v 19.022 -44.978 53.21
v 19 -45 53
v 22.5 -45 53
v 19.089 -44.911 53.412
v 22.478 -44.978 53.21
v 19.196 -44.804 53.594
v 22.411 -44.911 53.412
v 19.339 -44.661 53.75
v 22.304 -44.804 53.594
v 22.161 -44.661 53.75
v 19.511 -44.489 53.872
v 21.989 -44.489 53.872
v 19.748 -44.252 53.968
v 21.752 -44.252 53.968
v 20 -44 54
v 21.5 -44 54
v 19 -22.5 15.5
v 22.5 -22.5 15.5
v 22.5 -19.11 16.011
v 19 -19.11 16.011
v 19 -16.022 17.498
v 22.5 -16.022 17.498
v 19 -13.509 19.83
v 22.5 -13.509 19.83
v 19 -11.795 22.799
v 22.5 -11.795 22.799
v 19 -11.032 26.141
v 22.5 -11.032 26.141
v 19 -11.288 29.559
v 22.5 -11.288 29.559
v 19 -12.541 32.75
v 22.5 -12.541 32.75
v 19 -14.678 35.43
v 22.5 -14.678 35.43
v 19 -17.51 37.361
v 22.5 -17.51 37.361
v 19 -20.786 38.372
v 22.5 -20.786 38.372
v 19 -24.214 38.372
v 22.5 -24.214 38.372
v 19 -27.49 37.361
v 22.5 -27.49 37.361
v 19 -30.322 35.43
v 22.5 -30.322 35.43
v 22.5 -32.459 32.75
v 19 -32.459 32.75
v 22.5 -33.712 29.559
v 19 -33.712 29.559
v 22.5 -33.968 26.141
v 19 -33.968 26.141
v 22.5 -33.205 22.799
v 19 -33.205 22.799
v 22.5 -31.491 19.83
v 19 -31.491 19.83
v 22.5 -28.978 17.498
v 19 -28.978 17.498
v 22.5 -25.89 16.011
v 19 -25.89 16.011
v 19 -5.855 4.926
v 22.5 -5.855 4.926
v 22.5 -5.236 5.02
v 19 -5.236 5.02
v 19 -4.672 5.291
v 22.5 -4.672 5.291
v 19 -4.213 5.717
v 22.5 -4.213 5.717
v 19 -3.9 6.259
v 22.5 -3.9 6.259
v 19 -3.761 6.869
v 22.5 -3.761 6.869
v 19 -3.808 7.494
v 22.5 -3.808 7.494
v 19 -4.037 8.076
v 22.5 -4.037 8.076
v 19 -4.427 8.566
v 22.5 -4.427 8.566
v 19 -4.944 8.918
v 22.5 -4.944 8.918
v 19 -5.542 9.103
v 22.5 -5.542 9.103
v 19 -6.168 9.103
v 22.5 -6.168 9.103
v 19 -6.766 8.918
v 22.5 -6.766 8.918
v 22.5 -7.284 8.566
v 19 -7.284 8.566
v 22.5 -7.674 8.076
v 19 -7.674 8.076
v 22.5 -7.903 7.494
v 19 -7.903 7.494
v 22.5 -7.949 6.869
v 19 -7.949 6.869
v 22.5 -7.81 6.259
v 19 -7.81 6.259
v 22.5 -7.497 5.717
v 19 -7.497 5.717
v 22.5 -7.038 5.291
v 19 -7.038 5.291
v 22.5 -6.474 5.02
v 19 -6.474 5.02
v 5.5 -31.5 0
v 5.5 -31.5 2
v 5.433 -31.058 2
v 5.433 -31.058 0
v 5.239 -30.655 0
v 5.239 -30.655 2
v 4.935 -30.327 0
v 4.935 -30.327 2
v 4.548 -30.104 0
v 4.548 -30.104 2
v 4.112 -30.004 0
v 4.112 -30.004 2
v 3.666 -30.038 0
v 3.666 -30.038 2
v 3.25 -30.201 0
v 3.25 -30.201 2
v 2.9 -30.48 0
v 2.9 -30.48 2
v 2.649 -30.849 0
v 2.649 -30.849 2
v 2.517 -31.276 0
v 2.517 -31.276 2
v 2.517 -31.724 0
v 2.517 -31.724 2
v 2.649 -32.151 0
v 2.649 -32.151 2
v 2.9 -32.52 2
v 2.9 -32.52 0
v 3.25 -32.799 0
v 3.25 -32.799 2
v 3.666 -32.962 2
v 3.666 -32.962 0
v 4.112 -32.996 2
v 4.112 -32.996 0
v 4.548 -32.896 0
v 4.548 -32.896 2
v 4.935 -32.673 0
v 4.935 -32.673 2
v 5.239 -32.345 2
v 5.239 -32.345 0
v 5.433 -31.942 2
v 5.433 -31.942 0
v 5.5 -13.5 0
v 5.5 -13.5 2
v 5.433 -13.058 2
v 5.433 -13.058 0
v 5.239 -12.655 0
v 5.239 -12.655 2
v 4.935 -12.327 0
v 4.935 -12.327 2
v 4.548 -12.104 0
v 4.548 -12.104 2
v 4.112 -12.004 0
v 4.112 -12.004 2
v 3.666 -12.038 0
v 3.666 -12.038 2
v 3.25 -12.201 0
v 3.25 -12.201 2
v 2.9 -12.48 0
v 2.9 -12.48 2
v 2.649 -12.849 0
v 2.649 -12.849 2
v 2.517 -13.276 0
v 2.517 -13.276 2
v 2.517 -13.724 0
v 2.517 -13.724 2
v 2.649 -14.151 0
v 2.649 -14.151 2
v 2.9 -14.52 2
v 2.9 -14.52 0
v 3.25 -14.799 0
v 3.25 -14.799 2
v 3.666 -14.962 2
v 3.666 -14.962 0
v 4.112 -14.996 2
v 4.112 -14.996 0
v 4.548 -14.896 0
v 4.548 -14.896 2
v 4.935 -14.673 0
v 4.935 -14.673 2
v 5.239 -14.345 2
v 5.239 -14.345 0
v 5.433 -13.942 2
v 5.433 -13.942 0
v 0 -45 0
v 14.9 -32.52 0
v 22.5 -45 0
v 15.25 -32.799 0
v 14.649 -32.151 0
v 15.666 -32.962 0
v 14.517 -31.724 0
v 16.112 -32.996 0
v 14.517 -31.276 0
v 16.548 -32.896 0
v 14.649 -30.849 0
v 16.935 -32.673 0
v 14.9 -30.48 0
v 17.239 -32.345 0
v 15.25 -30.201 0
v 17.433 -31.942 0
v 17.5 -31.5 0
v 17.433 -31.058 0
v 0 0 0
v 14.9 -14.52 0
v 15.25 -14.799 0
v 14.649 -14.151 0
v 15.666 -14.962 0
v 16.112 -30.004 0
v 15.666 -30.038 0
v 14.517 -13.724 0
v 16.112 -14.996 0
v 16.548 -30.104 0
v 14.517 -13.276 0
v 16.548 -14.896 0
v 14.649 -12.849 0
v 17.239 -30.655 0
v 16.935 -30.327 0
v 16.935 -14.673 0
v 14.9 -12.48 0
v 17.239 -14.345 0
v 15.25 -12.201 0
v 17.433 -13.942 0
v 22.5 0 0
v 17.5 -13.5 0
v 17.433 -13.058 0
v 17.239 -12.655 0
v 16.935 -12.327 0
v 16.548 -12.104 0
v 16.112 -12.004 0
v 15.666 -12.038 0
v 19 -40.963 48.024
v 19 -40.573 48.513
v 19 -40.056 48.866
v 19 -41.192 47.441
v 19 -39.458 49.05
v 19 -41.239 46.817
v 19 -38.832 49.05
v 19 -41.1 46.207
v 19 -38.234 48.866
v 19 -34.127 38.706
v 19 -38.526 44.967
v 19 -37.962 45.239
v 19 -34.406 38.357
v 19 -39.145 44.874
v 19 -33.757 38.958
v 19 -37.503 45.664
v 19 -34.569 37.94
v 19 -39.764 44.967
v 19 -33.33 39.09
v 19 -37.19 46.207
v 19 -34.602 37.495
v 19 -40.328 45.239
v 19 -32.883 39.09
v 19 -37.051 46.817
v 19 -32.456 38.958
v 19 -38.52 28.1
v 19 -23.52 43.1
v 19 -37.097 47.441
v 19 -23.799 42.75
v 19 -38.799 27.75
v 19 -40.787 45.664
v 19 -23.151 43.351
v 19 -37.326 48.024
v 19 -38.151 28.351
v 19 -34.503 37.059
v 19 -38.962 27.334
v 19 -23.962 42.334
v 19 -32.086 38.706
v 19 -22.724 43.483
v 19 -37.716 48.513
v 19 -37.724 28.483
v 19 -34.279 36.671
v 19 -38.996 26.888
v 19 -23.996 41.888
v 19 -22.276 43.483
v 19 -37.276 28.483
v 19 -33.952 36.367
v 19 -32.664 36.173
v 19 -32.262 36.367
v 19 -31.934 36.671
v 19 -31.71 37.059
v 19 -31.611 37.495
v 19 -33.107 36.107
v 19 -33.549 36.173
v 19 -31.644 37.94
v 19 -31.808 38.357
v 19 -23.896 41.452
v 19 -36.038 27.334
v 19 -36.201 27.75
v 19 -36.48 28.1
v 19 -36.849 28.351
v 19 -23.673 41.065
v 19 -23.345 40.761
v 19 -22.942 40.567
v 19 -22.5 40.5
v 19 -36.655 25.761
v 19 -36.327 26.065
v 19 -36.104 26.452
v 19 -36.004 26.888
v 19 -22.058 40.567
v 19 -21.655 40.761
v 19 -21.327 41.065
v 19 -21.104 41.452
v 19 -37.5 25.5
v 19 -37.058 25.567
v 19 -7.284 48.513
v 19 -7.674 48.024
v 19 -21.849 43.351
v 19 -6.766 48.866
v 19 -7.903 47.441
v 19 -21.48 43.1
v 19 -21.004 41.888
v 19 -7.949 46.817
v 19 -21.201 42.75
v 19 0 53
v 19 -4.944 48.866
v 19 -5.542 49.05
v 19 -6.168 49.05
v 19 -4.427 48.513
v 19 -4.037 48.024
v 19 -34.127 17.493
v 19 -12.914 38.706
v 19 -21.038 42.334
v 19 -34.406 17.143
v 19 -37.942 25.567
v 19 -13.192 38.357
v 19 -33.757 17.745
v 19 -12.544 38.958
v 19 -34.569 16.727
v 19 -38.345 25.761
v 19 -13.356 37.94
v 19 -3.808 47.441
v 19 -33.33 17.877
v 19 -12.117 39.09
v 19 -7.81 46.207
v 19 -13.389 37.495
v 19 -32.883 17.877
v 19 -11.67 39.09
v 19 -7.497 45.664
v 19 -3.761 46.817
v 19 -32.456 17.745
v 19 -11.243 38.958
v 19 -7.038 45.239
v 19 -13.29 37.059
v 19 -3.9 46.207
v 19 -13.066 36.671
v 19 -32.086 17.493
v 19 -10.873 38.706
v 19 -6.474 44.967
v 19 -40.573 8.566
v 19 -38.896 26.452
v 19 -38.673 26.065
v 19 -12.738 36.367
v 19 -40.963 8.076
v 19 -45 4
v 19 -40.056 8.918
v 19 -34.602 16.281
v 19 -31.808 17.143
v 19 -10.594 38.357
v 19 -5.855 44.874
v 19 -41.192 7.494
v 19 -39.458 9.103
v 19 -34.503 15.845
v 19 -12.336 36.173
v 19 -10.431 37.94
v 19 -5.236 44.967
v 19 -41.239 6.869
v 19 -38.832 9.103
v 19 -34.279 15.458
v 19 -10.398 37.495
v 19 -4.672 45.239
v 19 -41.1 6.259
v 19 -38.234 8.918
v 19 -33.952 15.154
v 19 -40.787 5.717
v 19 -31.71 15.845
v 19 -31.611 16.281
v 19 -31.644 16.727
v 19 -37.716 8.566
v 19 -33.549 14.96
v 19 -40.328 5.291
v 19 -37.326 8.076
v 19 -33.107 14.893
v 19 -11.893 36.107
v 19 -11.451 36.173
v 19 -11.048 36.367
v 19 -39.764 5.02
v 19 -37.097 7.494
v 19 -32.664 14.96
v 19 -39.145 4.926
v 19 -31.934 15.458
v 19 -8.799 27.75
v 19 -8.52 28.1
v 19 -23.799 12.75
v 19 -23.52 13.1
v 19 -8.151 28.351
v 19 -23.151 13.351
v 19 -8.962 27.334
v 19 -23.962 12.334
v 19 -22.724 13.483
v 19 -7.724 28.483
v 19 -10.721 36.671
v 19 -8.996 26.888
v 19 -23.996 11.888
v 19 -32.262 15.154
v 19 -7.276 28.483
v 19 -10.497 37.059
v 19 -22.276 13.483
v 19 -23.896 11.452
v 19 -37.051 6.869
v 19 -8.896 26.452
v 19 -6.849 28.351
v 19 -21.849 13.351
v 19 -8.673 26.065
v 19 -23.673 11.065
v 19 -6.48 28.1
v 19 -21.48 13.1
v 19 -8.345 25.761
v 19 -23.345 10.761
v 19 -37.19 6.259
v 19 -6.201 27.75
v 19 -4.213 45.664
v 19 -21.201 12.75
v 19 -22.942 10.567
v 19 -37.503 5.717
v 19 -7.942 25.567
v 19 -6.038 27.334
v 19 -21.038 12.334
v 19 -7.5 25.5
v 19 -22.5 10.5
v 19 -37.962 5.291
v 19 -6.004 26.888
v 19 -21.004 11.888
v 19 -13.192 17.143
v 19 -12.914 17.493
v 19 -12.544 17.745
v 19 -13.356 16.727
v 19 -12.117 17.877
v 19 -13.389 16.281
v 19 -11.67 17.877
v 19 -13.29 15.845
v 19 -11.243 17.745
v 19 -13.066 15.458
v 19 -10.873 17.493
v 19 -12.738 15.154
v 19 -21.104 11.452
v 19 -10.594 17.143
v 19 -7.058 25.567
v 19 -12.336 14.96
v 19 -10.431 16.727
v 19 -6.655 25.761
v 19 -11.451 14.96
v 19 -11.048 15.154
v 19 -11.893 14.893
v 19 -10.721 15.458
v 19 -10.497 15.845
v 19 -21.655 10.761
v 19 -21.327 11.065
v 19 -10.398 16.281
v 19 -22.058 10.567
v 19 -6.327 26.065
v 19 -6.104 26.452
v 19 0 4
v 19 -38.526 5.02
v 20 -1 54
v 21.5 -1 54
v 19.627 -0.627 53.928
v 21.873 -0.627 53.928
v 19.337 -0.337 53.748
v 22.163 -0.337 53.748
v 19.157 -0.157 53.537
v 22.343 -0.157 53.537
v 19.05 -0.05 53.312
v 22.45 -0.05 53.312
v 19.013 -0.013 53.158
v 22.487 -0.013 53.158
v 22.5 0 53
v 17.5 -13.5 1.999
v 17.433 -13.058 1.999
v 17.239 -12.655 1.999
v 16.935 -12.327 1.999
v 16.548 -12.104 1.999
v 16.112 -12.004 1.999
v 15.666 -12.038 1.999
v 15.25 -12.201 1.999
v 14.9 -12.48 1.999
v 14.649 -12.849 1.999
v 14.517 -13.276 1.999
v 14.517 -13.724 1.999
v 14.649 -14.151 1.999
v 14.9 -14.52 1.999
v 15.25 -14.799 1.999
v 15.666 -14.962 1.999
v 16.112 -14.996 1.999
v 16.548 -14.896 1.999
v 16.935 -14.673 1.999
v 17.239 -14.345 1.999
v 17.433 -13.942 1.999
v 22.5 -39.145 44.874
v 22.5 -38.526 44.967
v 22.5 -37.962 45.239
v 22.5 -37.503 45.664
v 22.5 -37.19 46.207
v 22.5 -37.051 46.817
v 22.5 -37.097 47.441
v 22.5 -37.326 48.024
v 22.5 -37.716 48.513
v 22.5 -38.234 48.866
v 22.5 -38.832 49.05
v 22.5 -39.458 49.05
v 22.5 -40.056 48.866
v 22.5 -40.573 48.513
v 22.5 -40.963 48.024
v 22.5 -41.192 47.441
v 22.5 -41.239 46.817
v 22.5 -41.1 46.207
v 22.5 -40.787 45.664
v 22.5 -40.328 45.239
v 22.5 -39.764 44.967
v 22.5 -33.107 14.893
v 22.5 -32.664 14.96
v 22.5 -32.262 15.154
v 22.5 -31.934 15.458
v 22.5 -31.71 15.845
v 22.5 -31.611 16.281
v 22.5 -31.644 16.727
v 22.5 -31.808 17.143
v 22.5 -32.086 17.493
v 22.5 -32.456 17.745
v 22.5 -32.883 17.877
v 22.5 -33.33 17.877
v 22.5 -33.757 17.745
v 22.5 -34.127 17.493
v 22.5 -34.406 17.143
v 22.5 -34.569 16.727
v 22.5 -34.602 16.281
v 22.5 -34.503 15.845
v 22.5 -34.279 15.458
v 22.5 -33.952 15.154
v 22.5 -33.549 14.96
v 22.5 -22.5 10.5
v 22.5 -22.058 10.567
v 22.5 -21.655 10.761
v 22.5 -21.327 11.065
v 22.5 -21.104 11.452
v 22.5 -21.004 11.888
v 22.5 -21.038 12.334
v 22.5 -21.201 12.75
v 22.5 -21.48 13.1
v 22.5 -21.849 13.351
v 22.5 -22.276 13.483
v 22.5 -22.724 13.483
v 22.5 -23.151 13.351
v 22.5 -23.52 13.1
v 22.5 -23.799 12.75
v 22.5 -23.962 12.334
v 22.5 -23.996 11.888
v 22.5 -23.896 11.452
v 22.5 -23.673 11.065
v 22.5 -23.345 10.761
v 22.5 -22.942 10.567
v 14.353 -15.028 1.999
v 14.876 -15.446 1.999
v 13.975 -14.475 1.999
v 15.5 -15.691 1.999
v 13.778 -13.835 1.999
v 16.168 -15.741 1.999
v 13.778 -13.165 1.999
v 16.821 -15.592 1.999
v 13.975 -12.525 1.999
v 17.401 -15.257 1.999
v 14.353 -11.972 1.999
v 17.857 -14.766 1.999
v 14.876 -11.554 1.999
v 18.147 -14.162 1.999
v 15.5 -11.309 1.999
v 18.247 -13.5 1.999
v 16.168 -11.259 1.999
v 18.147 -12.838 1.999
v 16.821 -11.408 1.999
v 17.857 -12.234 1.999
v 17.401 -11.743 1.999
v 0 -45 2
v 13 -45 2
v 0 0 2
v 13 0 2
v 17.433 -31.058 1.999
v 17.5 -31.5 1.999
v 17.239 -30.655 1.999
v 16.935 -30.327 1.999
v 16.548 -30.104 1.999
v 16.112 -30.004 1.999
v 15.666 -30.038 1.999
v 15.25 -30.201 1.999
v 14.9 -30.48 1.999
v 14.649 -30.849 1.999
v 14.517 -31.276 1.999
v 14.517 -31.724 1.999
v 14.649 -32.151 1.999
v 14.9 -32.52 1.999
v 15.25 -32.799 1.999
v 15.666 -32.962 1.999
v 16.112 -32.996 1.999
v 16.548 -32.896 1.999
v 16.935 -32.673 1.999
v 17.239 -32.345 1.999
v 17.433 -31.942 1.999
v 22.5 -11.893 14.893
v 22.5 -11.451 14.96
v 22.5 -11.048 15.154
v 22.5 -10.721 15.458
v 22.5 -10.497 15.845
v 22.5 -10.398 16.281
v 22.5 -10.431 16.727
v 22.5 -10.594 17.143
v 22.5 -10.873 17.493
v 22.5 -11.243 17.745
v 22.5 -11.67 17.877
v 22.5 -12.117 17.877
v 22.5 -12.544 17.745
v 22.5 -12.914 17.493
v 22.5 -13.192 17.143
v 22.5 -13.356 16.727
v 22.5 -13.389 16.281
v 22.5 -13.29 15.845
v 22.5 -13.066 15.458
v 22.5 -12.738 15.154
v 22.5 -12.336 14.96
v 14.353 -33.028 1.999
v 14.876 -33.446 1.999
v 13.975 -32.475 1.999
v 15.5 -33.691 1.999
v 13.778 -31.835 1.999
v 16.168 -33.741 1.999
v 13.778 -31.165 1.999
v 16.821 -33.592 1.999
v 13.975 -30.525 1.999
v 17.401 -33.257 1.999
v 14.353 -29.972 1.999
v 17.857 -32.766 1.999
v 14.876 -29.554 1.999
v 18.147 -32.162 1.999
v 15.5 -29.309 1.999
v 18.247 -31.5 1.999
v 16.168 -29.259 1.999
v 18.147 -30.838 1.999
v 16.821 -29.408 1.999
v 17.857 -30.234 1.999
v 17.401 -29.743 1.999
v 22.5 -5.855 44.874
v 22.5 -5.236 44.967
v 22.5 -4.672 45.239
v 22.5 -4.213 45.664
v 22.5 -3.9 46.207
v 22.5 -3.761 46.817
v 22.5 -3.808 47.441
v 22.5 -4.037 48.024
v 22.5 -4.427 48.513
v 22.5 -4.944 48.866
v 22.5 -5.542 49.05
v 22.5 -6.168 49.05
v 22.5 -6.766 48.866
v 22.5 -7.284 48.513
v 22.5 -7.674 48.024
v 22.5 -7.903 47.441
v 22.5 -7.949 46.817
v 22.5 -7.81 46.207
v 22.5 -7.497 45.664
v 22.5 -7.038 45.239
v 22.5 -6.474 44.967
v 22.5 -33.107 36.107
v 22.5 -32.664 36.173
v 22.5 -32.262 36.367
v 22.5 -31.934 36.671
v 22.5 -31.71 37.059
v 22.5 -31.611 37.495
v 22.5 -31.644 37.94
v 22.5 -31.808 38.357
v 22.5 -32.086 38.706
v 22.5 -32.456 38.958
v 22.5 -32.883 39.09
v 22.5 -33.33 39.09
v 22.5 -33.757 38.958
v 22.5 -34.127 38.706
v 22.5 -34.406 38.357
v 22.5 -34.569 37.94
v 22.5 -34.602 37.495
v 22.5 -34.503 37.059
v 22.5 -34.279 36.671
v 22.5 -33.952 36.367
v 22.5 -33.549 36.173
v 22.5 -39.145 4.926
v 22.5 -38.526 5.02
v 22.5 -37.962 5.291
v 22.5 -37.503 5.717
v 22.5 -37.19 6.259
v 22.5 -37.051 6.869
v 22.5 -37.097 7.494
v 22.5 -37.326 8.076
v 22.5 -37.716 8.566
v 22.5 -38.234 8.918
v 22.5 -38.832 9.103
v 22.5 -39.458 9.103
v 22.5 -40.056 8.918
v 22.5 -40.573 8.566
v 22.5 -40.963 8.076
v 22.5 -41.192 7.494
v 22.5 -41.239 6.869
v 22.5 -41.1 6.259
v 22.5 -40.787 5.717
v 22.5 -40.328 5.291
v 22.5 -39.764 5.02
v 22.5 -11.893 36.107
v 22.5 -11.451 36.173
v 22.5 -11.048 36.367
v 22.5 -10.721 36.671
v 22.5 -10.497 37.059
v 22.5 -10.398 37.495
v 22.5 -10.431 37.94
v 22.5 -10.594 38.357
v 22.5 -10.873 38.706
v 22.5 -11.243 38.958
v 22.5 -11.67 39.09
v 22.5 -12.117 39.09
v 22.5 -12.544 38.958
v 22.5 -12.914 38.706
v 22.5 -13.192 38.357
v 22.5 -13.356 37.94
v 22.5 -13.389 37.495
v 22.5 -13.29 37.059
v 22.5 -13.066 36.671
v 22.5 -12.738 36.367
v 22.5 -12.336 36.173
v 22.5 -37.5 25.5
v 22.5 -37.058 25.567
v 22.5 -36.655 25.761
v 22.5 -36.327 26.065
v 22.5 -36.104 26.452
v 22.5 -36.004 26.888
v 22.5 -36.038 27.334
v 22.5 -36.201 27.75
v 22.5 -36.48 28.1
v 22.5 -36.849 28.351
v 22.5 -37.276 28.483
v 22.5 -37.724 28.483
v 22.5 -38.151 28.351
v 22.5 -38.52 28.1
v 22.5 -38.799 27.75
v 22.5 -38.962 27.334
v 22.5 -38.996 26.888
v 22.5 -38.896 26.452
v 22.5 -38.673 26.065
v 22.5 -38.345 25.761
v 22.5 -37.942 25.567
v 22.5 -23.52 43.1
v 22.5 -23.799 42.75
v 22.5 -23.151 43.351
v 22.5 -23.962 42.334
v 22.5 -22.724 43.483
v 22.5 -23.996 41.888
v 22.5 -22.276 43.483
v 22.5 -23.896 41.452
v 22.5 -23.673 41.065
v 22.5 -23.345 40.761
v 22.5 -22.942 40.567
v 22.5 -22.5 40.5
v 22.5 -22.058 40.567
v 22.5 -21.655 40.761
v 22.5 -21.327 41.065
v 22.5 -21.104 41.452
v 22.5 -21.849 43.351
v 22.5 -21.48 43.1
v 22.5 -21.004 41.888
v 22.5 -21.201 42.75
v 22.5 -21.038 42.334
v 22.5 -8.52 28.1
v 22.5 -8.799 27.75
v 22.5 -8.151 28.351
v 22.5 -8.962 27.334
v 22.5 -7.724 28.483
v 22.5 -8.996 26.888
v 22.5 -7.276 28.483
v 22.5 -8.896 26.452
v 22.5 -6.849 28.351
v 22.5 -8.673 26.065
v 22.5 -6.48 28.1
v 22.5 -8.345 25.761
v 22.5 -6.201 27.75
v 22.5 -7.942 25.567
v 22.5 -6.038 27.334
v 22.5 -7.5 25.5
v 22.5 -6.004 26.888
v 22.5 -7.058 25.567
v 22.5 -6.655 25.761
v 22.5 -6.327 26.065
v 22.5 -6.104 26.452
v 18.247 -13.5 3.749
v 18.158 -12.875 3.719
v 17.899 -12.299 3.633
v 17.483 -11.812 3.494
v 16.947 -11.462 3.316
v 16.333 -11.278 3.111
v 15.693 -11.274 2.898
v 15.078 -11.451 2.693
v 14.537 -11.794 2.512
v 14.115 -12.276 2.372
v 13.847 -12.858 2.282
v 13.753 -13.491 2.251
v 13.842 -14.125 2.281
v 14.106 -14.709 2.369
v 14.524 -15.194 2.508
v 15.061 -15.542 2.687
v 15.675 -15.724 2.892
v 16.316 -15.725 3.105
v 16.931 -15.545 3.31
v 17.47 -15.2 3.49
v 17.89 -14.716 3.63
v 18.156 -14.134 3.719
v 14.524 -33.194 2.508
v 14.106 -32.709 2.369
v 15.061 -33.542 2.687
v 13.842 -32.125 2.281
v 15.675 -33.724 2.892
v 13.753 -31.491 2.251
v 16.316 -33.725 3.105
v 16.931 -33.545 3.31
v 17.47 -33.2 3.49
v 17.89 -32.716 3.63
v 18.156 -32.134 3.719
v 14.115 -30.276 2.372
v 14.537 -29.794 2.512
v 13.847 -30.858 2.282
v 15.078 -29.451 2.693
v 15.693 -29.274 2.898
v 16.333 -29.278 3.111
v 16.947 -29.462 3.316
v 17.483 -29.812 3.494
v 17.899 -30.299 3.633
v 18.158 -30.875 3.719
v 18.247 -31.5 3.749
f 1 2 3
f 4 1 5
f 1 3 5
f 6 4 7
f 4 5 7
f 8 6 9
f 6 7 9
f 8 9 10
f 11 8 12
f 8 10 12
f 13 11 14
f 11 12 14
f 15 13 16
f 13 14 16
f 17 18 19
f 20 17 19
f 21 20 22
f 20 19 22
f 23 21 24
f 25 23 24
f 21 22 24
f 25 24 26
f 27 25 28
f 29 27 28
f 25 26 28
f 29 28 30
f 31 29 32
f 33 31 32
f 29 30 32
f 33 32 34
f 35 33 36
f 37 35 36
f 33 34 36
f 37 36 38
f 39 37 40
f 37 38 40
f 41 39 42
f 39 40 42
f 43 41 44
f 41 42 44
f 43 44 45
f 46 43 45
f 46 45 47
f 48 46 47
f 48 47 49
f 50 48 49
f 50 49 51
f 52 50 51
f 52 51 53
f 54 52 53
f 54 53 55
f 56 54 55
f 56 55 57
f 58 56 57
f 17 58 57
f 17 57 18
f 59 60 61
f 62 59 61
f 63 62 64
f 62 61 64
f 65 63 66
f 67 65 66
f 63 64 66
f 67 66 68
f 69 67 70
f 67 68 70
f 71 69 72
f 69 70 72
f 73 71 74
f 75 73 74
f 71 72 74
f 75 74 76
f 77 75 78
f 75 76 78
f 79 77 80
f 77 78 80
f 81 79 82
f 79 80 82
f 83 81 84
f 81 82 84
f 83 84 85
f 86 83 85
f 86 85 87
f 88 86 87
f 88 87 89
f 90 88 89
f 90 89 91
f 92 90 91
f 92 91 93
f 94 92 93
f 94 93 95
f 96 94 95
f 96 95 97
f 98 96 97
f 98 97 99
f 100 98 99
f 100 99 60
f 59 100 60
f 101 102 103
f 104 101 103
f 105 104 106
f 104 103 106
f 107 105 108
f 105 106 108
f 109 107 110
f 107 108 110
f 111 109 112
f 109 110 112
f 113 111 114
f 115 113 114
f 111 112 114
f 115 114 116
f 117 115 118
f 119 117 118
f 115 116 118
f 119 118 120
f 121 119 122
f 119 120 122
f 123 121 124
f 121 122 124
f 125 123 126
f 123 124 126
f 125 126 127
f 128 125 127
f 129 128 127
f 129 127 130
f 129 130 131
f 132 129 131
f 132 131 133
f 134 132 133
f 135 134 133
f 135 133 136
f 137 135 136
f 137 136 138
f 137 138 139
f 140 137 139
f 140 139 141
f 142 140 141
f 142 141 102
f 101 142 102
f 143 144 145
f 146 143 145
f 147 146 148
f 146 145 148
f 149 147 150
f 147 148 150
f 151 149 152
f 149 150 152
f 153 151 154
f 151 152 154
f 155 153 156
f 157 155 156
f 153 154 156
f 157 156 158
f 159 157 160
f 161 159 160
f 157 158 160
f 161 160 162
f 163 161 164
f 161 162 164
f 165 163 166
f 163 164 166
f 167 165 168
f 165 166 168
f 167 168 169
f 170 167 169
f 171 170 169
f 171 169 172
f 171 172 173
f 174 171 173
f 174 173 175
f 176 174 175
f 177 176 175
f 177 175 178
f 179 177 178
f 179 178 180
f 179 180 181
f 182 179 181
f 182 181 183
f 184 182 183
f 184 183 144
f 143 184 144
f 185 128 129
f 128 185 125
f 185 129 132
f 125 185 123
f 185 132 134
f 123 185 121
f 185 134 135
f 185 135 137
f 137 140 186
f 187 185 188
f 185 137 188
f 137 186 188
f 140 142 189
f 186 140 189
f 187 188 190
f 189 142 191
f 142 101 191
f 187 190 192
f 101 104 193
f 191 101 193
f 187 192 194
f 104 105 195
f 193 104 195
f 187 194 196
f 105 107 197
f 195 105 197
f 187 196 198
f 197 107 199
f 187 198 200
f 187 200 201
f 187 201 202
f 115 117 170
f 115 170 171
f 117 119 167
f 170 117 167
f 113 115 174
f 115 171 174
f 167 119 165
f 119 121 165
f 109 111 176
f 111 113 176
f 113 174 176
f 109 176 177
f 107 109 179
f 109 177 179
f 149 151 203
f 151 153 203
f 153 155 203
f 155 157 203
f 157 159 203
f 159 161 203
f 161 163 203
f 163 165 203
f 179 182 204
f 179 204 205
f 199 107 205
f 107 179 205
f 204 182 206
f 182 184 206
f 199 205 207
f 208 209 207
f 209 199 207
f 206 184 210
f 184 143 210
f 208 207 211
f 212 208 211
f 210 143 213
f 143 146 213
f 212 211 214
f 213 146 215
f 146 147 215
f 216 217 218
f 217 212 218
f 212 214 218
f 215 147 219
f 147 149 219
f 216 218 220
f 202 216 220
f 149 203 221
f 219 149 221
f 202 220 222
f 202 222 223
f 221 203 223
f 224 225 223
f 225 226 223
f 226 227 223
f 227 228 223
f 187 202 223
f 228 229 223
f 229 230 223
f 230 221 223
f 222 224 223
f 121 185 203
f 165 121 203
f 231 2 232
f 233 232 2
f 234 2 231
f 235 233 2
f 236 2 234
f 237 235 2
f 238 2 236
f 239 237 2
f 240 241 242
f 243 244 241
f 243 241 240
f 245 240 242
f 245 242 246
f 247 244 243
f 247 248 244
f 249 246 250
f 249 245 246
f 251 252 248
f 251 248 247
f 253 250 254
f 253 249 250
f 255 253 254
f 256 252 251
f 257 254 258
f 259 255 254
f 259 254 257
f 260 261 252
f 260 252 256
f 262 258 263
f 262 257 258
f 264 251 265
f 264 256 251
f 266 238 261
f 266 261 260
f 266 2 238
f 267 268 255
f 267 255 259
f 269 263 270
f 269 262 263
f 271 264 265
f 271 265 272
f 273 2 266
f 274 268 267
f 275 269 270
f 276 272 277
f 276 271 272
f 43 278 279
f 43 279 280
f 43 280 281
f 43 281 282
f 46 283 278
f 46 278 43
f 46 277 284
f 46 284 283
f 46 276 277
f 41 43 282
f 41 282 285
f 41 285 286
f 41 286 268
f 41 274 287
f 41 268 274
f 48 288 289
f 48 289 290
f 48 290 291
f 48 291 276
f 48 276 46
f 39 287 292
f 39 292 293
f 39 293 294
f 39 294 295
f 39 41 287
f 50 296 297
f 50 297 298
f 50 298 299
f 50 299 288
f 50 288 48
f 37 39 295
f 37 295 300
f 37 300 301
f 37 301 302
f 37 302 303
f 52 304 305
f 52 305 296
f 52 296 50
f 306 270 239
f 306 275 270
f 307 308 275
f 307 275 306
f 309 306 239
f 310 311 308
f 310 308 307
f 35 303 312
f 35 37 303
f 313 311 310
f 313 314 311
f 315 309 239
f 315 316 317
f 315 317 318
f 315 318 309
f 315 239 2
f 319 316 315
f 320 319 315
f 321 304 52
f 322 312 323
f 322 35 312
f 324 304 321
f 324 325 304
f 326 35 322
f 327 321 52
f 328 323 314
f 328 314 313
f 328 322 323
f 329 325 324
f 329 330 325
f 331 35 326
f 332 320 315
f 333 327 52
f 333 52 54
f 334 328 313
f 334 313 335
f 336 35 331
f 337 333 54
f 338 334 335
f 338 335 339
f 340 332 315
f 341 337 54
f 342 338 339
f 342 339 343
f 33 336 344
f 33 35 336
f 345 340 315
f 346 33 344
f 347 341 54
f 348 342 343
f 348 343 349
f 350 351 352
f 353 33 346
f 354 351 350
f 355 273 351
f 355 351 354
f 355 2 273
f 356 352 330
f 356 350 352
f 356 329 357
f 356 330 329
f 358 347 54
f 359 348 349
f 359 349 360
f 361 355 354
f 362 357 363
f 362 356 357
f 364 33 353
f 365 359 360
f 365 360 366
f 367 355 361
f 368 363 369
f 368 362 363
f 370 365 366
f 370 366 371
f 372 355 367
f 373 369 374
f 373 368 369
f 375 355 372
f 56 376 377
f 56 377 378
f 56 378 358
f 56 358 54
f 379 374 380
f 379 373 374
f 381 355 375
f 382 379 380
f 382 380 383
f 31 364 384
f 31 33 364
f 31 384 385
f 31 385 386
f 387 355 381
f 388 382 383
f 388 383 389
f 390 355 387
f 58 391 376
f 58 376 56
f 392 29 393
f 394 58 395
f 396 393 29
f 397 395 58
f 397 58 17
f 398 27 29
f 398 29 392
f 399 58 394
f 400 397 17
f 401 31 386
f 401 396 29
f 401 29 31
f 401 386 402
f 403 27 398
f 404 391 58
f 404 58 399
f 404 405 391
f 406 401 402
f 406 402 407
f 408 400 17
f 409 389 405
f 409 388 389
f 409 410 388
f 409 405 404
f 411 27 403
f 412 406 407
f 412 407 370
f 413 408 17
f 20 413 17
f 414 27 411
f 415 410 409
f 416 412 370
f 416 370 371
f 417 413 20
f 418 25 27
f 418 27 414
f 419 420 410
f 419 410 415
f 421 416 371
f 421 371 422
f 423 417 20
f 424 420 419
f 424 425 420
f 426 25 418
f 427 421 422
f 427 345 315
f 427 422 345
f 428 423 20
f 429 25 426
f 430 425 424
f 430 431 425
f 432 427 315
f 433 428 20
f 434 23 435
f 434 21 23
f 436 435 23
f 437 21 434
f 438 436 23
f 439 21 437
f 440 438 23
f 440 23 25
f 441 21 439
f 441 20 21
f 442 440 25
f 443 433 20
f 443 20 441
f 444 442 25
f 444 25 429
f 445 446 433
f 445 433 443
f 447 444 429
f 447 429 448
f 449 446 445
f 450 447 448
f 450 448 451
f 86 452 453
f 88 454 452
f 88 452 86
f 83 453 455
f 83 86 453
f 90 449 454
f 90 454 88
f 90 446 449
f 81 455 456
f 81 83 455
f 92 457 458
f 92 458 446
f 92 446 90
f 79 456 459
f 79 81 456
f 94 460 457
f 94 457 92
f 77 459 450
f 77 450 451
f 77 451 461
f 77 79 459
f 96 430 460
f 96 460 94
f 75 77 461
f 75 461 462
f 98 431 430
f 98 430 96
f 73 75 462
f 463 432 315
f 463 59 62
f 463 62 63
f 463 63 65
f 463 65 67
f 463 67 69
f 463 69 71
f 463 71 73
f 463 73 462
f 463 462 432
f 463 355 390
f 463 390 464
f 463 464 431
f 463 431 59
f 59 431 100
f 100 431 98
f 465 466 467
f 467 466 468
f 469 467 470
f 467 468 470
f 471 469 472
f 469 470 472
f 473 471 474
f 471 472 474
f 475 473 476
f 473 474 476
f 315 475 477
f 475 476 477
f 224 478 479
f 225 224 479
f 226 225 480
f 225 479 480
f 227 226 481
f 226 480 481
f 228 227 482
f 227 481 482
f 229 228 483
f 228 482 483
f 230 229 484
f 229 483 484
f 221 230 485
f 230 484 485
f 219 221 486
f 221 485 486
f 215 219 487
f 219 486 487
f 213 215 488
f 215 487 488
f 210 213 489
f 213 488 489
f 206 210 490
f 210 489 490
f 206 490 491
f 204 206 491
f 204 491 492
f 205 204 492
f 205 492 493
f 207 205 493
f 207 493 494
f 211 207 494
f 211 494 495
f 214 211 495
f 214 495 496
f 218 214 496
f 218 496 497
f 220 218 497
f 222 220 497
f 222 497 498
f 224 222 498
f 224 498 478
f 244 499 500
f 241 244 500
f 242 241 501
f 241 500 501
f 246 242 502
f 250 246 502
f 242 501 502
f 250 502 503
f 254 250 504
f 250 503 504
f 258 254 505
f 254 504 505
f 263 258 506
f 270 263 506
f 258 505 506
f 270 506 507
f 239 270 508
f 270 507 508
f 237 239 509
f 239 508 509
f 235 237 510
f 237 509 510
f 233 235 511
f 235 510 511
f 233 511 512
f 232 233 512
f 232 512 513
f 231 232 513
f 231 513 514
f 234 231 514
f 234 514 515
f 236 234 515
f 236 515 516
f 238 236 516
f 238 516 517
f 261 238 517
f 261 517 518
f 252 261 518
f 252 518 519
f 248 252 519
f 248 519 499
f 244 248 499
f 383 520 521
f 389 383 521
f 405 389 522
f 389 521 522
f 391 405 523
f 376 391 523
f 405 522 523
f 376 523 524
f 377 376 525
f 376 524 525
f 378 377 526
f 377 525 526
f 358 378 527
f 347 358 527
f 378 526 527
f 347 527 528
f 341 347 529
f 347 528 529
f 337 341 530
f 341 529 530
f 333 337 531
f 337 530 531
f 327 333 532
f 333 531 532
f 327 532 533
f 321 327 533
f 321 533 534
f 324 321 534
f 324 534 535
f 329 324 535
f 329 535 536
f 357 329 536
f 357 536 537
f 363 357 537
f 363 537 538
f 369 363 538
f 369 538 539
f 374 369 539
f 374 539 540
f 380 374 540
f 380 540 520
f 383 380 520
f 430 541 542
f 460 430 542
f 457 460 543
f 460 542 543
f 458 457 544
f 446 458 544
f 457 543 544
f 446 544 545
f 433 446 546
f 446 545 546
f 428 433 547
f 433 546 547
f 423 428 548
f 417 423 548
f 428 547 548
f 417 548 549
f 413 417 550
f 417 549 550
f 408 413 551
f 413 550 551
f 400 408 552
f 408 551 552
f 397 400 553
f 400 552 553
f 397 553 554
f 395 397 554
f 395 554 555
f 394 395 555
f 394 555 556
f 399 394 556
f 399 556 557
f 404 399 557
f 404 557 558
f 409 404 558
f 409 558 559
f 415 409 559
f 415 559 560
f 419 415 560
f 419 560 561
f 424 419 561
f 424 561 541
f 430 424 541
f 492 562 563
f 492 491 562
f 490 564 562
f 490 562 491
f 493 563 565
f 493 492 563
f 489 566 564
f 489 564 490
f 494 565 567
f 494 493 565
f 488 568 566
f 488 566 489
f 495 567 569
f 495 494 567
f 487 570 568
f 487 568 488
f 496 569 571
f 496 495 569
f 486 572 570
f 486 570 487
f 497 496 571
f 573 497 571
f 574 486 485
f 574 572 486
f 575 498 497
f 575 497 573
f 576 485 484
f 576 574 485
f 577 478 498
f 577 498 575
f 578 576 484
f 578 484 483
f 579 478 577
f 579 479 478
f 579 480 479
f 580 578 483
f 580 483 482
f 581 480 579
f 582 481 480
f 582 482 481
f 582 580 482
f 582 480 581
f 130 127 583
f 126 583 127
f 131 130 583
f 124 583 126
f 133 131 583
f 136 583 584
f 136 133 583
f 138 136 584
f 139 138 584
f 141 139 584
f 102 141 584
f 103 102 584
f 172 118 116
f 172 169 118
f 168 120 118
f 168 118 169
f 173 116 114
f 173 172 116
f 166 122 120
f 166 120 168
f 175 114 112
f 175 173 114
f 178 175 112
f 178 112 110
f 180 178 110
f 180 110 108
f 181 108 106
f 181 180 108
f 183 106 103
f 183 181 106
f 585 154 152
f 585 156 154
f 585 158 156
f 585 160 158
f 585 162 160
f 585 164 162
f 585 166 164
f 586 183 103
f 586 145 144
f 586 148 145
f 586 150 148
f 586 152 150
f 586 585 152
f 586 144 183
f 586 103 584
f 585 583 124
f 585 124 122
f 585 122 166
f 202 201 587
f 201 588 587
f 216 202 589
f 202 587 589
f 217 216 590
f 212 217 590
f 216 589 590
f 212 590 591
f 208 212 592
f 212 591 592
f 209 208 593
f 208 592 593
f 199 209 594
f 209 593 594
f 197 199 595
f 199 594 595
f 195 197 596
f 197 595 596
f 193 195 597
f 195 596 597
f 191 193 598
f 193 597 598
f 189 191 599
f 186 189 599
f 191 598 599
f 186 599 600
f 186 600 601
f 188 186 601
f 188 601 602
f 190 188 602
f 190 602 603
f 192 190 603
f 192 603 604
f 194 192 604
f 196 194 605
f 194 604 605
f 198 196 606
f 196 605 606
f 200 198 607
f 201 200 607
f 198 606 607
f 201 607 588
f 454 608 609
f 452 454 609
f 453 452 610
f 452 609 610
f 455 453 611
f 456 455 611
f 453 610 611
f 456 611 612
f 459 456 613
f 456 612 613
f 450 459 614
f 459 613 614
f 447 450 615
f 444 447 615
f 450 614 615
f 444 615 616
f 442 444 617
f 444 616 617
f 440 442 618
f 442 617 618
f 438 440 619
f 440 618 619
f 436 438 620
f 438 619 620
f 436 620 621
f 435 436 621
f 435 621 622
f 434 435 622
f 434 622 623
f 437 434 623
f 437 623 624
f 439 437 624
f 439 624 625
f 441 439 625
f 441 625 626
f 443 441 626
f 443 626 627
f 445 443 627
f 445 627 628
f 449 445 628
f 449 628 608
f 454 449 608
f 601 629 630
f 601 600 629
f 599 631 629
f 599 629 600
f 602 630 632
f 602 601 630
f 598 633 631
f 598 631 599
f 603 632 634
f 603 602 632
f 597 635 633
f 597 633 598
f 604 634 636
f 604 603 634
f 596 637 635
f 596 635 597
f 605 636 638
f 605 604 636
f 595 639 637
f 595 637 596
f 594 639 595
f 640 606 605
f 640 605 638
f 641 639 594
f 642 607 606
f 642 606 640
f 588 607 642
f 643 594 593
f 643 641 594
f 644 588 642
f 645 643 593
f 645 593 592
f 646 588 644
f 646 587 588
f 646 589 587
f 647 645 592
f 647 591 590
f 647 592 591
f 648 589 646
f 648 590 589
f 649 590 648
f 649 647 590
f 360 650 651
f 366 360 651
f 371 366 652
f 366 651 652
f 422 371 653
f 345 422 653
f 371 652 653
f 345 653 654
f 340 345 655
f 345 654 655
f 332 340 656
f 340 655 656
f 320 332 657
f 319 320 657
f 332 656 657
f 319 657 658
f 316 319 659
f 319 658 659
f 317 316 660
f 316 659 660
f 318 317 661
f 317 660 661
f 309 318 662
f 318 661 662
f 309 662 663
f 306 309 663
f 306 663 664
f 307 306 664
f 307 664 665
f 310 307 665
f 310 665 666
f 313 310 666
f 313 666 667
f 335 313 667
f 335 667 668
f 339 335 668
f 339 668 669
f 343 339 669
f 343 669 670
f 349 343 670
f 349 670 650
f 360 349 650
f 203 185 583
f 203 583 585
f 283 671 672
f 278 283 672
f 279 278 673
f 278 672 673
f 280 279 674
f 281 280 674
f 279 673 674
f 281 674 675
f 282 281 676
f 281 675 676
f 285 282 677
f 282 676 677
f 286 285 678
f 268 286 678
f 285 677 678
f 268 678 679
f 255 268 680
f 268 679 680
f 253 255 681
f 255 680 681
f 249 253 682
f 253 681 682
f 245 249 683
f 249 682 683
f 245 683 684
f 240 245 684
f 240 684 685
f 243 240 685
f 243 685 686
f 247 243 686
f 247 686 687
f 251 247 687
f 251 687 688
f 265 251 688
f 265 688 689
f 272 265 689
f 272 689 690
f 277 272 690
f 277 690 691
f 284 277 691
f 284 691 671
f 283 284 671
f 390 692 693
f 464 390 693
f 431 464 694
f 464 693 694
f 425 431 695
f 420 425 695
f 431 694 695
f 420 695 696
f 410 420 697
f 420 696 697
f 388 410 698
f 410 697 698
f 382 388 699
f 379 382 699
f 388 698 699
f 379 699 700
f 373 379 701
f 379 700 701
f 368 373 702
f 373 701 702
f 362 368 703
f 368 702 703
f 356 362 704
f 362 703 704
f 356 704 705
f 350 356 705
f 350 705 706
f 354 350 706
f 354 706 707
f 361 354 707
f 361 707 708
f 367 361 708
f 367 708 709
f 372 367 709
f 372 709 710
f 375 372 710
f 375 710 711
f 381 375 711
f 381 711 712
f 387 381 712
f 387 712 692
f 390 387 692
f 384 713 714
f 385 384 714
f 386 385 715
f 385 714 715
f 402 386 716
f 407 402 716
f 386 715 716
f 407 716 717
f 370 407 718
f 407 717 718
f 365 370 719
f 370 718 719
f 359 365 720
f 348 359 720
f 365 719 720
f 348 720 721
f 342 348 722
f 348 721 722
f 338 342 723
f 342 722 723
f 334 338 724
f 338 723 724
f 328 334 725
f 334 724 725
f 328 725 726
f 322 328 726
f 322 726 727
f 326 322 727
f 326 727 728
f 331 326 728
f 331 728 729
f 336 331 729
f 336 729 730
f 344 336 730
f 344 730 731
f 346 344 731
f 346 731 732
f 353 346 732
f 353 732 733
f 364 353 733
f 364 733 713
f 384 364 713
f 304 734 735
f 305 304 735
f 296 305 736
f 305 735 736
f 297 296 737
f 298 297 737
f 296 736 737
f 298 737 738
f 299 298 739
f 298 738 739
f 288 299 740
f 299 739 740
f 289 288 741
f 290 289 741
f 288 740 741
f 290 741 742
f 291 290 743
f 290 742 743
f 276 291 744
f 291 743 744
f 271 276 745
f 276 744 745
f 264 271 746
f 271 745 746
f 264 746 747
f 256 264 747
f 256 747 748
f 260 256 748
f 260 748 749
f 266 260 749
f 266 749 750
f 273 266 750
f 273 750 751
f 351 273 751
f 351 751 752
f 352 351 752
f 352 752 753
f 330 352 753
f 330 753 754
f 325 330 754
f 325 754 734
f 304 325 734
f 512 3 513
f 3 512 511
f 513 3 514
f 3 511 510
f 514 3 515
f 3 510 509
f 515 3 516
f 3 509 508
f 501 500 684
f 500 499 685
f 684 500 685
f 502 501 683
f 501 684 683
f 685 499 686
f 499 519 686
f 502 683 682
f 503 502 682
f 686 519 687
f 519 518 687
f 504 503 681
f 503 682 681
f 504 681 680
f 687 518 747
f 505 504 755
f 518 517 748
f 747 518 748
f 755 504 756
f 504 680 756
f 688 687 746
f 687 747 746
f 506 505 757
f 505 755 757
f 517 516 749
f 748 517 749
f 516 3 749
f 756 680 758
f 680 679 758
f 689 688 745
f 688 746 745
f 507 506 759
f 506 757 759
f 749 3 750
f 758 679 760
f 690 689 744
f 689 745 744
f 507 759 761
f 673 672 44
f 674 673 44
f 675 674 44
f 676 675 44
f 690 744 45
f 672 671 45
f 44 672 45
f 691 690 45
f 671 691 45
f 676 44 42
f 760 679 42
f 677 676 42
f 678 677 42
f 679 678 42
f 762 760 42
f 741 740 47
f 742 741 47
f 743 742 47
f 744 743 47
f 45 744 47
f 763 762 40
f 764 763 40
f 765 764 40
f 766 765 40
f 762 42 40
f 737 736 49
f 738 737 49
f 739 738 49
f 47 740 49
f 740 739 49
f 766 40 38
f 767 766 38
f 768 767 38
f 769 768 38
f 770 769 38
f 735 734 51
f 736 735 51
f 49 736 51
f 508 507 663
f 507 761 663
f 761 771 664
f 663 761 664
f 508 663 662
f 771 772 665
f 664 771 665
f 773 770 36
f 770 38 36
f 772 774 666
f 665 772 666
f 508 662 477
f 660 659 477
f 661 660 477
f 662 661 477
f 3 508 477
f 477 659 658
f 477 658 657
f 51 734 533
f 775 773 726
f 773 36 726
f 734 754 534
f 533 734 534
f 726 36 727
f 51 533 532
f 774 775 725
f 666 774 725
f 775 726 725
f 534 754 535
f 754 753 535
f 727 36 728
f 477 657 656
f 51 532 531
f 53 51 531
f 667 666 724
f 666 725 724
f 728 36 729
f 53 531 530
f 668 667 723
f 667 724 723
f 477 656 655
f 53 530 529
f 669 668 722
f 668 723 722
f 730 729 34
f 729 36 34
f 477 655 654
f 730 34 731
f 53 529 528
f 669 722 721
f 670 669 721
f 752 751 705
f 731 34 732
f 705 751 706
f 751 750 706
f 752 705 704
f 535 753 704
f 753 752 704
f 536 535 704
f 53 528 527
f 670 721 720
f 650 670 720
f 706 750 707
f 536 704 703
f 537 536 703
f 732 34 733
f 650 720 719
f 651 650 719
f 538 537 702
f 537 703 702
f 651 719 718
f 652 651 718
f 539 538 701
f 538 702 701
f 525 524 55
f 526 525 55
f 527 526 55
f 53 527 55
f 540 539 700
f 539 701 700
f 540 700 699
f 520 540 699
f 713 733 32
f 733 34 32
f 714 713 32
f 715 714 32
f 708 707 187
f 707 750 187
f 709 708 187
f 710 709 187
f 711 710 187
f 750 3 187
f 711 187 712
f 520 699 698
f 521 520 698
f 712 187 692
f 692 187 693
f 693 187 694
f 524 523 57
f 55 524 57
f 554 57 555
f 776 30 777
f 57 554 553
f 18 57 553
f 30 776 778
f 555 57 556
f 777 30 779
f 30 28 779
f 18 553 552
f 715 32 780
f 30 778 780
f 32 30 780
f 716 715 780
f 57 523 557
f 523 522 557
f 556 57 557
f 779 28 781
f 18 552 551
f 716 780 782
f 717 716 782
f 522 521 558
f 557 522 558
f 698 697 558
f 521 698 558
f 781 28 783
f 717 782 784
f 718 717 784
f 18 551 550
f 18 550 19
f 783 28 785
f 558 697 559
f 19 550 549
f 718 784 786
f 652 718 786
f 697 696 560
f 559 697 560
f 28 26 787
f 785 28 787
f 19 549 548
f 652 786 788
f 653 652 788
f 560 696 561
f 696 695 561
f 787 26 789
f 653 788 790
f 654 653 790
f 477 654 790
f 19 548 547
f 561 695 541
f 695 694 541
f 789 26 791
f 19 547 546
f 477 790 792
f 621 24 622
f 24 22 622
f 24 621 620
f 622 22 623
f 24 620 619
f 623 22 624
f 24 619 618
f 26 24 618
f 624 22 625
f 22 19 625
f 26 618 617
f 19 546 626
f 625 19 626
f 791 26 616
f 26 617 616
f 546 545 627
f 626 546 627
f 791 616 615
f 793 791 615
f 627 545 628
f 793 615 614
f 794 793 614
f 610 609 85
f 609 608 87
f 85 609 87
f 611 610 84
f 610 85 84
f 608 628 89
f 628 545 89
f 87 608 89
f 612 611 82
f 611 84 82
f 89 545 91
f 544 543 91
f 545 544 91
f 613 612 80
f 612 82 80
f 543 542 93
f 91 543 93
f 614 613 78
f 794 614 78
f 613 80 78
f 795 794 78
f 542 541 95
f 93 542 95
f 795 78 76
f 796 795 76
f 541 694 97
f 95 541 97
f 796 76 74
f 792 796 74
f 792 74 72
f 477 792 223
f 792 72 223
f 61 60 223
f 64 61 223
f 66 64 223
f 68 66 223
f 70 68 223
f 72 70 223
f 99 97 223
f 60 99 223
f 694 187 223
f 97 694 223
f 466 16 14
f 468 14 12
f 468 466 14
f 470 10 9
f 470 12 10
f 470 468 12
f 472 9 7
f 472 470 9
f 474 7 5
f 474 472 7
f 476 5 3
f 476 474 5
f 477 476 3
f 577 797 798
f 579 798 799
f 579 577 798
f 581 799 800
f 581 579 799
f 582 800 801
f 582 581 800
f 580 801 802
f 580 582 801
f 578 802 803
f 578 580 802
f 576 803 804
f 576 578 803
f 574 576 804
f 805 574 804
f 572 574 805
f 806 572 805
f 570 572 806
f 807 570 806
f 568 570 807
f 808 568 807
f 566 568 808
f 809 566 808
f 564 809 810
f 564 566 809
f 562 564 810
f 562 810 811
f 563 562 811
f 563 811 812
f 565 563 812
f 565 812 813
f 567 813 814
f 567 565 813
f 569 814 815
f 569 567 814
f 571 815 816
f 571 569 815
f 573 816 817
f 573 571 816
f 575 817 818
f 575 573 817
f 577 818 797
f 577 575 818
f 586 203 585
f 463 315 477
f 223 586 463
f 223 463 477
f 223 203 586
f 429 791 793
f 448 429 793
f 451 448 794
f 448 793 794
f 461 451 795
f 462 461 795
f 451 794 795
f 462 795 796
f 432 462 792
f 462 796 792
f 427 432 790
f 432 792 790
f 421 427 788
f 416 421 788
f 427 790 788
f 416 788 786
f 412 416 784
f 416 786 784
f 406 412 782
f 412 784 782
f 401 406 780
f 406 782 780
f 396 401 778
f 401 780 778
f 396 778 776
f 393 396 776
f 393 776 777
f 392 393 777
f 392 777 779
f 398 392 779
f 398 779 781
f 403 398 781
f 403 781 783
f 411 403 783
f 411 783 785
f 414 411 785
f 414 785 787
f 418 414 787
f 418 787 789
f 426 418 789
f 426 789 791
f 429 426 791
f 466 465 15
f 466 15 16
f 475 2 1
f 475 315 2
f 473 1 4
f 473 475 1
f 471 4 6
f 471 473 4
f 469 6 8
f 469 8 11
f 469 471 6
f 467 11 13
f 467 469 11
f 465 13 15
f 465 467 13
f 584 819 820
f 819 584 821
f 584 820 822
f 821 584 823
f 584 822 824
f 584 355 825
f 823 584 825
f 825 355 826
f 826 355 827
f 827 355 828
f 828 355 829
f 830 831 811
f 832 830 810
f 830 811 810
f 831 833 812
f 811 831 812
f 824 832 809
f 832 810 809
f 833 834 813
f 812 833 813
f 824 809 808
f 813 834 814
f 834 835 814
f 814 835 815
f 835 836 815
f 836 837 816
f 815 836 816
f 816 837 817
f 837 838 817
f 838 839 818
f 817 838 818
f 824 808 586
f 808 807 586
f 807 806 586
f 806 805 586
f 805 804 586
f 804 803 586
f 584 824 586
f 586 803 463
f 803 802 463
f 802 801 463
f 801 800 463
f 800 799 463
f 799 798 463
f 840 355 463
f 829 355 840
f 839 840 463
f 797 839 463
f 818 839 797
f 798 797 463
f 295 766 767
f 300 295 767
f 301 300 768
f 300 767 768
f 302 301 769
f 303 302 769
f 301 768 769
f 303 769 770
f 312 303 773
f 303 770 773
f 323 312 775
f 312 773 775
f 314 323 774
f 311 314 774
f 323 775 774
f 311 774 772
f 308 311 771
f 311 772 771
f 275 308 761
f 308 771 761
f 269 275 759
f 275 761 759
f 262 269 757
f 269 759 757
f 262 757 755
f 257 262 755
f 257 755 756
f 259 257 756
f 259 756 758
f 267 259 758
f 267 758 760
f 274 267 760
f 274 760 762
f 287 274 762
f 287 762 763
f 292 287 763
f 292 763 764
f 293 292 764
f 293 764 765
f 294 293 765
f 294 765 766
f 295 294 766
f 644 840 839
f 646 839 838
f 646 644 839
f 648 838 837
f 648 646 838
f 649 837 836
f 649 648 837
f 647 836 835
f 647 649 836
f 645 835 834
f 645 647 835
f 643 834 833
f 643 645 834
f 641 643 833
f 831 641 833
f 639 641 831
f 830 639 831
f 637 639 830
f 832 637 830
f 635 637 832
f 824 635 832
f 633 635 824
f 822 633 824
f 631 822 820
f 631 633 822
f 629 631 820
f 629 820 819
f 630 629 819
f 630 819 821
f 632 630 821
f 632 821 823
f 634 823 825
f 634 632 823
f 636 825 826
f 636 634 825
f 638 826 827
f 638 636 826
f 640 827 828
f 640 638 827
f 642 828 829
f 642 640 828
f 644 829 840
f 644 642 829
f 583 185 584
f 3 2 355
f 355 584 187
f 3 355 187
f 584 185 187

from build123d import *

# Parameters (mm, degrees)
SKETCH_1_W               = 22.5
SKETCH_1_H               = 45
EXTRUDE_1_DEPTH          = 2
SKETCH_2_W               = 3.5
SKETCH_2_H               = 45
EXTRUDE_2_DEPTH          = 52
CUT_EXTRUDE_2_REACH      = 24.5
SKETCH_3_R               = 2.1
SKETCH_3_R_2             = 11.5
SKETCH_3_R_3             = 1.5
CHAMFER_1_SIZE           = 6
CHAMFER_1_SIZE2          = 2
FILLET_1_R               = 1
SKETCH_4_R               = 1.5
CUT_EXTRUDE_3_DEPTH      = 5
SKETCH_5_R               = 2.24713436
CUT_EXTRUDE_4_DEPTH      = 15
CUT_EXTRUDE_4_DEPTH_BACK = 0.001


with BuildPart() as part:
    # 草图1 → 凸台-拉伸1 (new body)
    with BuildSketch(Plane.XY):
        with Locations((11.25, -22.5)):
            Rectangle(SKETCH_1_W, SKETCH_1_H)
    extrude(amount=EXTRUDE_1_DEPTH)

    # 草图2 → 凸台-拉伸2 (add)
    with BuildSketch(Plane.XY.offset(2)):
        with Locations((20.75, -22.5)):
            Rectangle(SKETCH_2_W, SKETCH_2_H)
    extrude(amount=EXTRUDE_2_DEPTH)

    # 草图3 → 切除-拉伸2 (cut, up to next)
    with BuildSketch(Plane(origin=(22.5, 0, 0), x_dir=(0, 0, -1), z_dir=(1, 0, 0)), mode=Mode.PRIVATE) as cut_extrude_2_sk1:
        with Locations((-46.97375327, -5.855205609)):
            Circle(SKETCH_3_R)
    cut_extrude_2_tool1 = extrude(cut_extrude_2_sk1.sketch, amount=-CUT_EXTRUDE_2_REACH, mode=Mode.PRIVATE) & part.part
    add(cut_extrude_2_tool1.solids().sort_by_distance((22.5, -5.855206, 46.973753))[0], mode=Mode.SUBTRACT)
    # 草图3 → 切除-拉伸2 (cut, up to next)
    with BuildSketch(Plane(origin=(22.5, 0, 0), x_dir=(0, 0, -1), z_dir=(1, 0, 0)), mode=Mode.PRIVATE) as cut_extrude_2_sk2:
        with Locations((-7.02624673, -39.144794391)):
            Circle(SKETCH_3_R)
    cut_extrude_2_tool2 = extrude(cut_extrude_2_sk2.sketch, amount=-CUT_EXTRUDE_2_REACH, mode=Mode.PRIVATE) & part.part
    add(cut_extrude_2_tool2.solids().sort_by_distance((22.5, -39.144794, 7.026247))[0], mode=Mode.SUBTRACT)
    # 草图3 → 切除-拉伸2 (cut, up to next)
    with BuildSketch(Plane(origin=(22.5, 0, 0), x_dir=(0, 0, -1), z_dir=(1, 0, 0)), mode=Mode.PRIVATE) as cut_extrude_2_sk3:
        with Locations((-27, -22.5)):
            Circle(SKETCH_3_R_2)
    cut_extrude_2_tool3 = extrude(cut_extrude_2_sk3.sketch, amount=-CUT_EXTRUDE_2_REACH, mode=Mode.PRIVATE) & part.part
    add(cut_extrude_2_tool3.solids().sort_by_distance((22.5, -22.5, 27))[0], mode=Mode.SUBTRACT)
    # 草图3 → 切除-拉伸2 (cut, up to next)
    with BuildSketch(Plane(origin=(22.5, 0, 0), x_dir=(0, 0, -1), z_dir=(1, 0, 0)), mode=Mode.PRIVATE) as cut_extrude_2_sk4:
        with Locations((-46.97375327, -39.144794391)):
            Circle(SKETCH_3_R)
    cut_extrude_2_tool4 = extrude(cut_extrude_2_sk4.sketch, amount=-CUT_EXTRUDE_2_REACH, mode=Mode.PRIVATE) & part.part
    add(cut_extrude_2_tool4.solids().sort_by_distance((22.5, -39.144794, 46.973753))[0], mode=Mode.SUBTRACT)
    # 草图3 → 切除-拉伸2 (cut, up to next)
    with BuildSketch(Plane(origin=(22.5, 0, 0), x_dir=(0, 0, -1), z_dir=(1, 0, 0)), mode=Mode.PRIVATE) as cut_extrude_2_sk5:
        with Locations((-7.02624673, -5.855205609)):
            Circle(SKETCH_3_R)
    cut_extrude_2_tool5 = extrude(cut_extrude_2_sk5.sketch, amount=-CUT_EXTRUDE_2_REACH, mode=Mode.PRIVATE) & part.part
    add(cut_extrude_2_tool5.solids().sort_by_distance((22.5, -5.855206, 7.026247))[0], mode=Mode.SUBTRACT)
    # 草图3 → 切除-拉伸2 (cut, up to next)
    with BuildSketch(Plane(origin=(22.5, 0, 0), x_dir=(0, 0, -1), z_dir=(1, 0, 0)), mode=Mode.PRIVATE) as cut_extrude_2_sk6:
        with Locations((-42, -22.5)):
            Circle(SKETCH_3_R_3)
    cut_extrude_2_tool6 = extrude(cut_extrude_2_sk6.sketch, amount=-CUT_EXTRUDE_2_REACH, mode=Mode.PRIVATE) & part.part
    add(cut_extrude_2_tool6.solids().sort_by_distance((22.5, -22.5, 42))[0], mode=Mode.SUBTRACT)
    # 草图3 → 切除-拉伸2 (cut, up to next)
    with BuildSketch(Plane(origin=(22.5, 0, 0), x_dir=(0, 0, -1), z_dir=(1, 0, 0)), mode=Mode.PRIVATE) as cut_extrude_2_sk7:
        with Locations((-37.606601718, -11.893398282)):
            Circle(SKETCH_3_R_3)
    cut_extrude_2_tool7 = extrude(cut_extrude_2_sk7.sketch, amount=-CUT_EXTRUDE_2_REACH, mode=Mode.PRIVATE) & part.part
    add(cut_extrude_2_tool7.solids().sort_by_distance((22.5, -11.893398, 37.606602))[0], mode=Mode.SUBTRACT)
    # 草图3 → 切除-拉伸2 (cut, up to next)
    with BuildSketch(Plane(origin=(22.5, 0, 0), x_dir=(0, 0, -1), z_dir=(1, 0, 0)), mode=Mode.PRIVATE) as cut_extrude_2_sk8:
        with Locations((-27, -7.5)):
            Circle(SKETCH_3_R_3)
    cut_extrude_2_tool8 = extrude(cut_extrude_2_sk8.sketch, amount=-CUT_EXTRUDE_2_REACH, mode=Mode.PRIVATE) & part.part
    add(cut_extrude_2_tool8.solids().sort_by_distance((22.5, -7.5, 27))[0], mode=Mode.SUBTRACT)
    # 草图3 → 切除-拉伸2 (cut, up to next)
    with BuildSketch(Plane(origin=(22.5, 0, 0), x_dir=(0, 0, -1), z_dir=(1, 0, 0)), mode=Mode.PRIVATE) as cut_extrude_2_sk9:
        with Locations((-16.393398282, -11.893398282)):
            Circle(SKETCH_3_R_3)
    cut_extrude_2_tool9 = extrude(cut_extrude_2_sk9.sketch, amount=-CUT_EXTRUDE_2_REACH, mode=Mode.PRIVATE) & part.part
    add(cut_extrude_2_tool9.solids().sort_by_distance((22.5, -11.893398, 16.393398))[0], mode=Mode.SUBTRACT)
    # 草图3 → 切除-拉伸2 (cut, up to next)
    with BuildSketch(Plane(origin=(22.5, 0, 0), x_dir=(0, 0, -1), z_dir=(1, 0, 0)), mode=Mode.PRIVATE) as cut_extrude_2_sk10:
        with Locations((-12, -22.5)):
            Circle(SKETCH_3_R_3)
    cut_extrude_2_tool10 = extrude(cut_extrude_2_sk10.sketch, amount=-CUT_EXTRUDE_2_REACH, mode=Mode.PRIVATE) & part.part
    add(cut_extrude_2_tool10.solids().sort_by_distance((22.5, -22.5, 12))[0], mode=Mode.SUBTRACT)
    # 草图3 → 切除-拉伸2 (cut, up to next)
    with BuildSketch(Plane(origin=(22.5, 0, 0), x_dir=(0, 0, -1), z_dir=(1, 0, 0)), mode=Mode.PRIVATE) as cut_extrude_2_sk11:
        with Locations((-16.393398282, -33.106601718)):
            Circle(SKETCH_3_R_3)
    cut_extrude_2_tool11 = extrude(cut_extrude_2_sk11.sketch, amount=-CUT_EXTRUDE_2_REACH, mode=Mode.PRIVATE) & part.part
    add(cut_extrude_2_tool11.solids().sort_by_distance((22.5, -33.106602, 16.393398))[0], mode=Mode.SUBTRACT)
    # 草图3 → 切除-拉伸2 (cut, up to next)
    with BuildSketch(Plane(origin=(22.5, 0, 0), x_dir=(0, 0, -1), z_dir=(1, 0, 0)), mode=Mode.PRIVATE) as cut_extrude_2_sk12:
        with Locations((-27, -37.5)):
            Circle(SKETCH_3_R_3)
    cut_extrude_2_tool12 = extrude(cut_extrude_2_sk12.sketch, amount=-CUT_EXTRUDE_2_REACH, mode=Mode.PRIVATE) & part.part
    add(cut_extrude_2_tool12.solids().sort_by_distance((22.5, -37.5, 27))[0], mode=Mode.SUBTRACT)
    # 草图3 → 切除-拉伸2 (cut, up to next)
    with BuildSketch(Plane(origin=(22.5, 0, 0), x_dir=(0, 0, -1), z_dir=(1, 0, 0)), mode=Mode.PRIVATE) as cut_extrude_2_sk13:
        with Locations((-37.606601718, -33.106601718)):
            Circle(SKETCH_3_R_3)
    cut_extrude_2_tool13 = extrude(cut_extrude_2_sk13.sketch, amount=-CUT_EXTRUDE_2_REACH, mode=Mode.PRIVATE) & part.part
    add(cut_extrude_2_tool13.solids().sort_by_distance((22.5, -33.106602, 37.606602))[0], mode=Mode.SUBTRACT)

    # 倒角1
    chamfer_1_edges = [part.edges().sort_by_distance(p)[0] for p in [
        (19, -22.5, 2),
    ]]
    chamfer_1_side = [part.faces().sort_by_distance(p)[0] for p in [
        (9.5, -22.5, 2),
    ]]
    chamfer(chamfer_1_edges, length=CHAMFER_1_SIZE, length2=CHAMFER_1_SIZE2, reference=chamfer_1_side[0])

    # 圆角1
    fillet_1_edges = [part.edges().sort_by_distance(p)[0] for p in [
        (20.75, 0, 54),
        (19, -22.5, 54),
        (20.75, -45, 54),
        (22.5, -22.5, 54),
    ]]
    fillet(fillet_1_edges, radius=FILLET_1_R)

    # 草图4 → 切除-拉伸3 (cut, symmetric)
    with BuildSketch(Plane.XY.offset(2)):
        with Locations((4, -31.5)):
            Circle(SKETCH_4_R)
        with Locations((4, -13.5)):
            Circle(SKETCH_4_R)
        with Locations((16, -13.5)):
            Circle(SKETCH_4_R)
        with Locations((16, -31.5)):
            Circle(SKETCH_4_R)
    extrude(amount=CUT_EXTRUDE_3_DEPTH, both=True, mode=Mode.SUBTRACT)

    # 草图5 → 切除-拉伸4 (cut, two sides)
    with BuildSketch(Plane.XY.offset(2)) as cut_extrude_4_sk:
        with Locations((16, -13.5)):
            Circle(SKETCH_5_R)
        with Locations((16, -31.5)):
            Circle(SKETCH_5_R)
    extrude(amount=CUT_EXTRUDE_4_DEPTH, mode=Mode.SUBTRACT)
    extrude(cut_extrude_4_sk.sketch, amount=-CUT_EXTRUDE_4_DEPTH_BACK, mode=Mode.SUBTRACT)


solid = part.part
